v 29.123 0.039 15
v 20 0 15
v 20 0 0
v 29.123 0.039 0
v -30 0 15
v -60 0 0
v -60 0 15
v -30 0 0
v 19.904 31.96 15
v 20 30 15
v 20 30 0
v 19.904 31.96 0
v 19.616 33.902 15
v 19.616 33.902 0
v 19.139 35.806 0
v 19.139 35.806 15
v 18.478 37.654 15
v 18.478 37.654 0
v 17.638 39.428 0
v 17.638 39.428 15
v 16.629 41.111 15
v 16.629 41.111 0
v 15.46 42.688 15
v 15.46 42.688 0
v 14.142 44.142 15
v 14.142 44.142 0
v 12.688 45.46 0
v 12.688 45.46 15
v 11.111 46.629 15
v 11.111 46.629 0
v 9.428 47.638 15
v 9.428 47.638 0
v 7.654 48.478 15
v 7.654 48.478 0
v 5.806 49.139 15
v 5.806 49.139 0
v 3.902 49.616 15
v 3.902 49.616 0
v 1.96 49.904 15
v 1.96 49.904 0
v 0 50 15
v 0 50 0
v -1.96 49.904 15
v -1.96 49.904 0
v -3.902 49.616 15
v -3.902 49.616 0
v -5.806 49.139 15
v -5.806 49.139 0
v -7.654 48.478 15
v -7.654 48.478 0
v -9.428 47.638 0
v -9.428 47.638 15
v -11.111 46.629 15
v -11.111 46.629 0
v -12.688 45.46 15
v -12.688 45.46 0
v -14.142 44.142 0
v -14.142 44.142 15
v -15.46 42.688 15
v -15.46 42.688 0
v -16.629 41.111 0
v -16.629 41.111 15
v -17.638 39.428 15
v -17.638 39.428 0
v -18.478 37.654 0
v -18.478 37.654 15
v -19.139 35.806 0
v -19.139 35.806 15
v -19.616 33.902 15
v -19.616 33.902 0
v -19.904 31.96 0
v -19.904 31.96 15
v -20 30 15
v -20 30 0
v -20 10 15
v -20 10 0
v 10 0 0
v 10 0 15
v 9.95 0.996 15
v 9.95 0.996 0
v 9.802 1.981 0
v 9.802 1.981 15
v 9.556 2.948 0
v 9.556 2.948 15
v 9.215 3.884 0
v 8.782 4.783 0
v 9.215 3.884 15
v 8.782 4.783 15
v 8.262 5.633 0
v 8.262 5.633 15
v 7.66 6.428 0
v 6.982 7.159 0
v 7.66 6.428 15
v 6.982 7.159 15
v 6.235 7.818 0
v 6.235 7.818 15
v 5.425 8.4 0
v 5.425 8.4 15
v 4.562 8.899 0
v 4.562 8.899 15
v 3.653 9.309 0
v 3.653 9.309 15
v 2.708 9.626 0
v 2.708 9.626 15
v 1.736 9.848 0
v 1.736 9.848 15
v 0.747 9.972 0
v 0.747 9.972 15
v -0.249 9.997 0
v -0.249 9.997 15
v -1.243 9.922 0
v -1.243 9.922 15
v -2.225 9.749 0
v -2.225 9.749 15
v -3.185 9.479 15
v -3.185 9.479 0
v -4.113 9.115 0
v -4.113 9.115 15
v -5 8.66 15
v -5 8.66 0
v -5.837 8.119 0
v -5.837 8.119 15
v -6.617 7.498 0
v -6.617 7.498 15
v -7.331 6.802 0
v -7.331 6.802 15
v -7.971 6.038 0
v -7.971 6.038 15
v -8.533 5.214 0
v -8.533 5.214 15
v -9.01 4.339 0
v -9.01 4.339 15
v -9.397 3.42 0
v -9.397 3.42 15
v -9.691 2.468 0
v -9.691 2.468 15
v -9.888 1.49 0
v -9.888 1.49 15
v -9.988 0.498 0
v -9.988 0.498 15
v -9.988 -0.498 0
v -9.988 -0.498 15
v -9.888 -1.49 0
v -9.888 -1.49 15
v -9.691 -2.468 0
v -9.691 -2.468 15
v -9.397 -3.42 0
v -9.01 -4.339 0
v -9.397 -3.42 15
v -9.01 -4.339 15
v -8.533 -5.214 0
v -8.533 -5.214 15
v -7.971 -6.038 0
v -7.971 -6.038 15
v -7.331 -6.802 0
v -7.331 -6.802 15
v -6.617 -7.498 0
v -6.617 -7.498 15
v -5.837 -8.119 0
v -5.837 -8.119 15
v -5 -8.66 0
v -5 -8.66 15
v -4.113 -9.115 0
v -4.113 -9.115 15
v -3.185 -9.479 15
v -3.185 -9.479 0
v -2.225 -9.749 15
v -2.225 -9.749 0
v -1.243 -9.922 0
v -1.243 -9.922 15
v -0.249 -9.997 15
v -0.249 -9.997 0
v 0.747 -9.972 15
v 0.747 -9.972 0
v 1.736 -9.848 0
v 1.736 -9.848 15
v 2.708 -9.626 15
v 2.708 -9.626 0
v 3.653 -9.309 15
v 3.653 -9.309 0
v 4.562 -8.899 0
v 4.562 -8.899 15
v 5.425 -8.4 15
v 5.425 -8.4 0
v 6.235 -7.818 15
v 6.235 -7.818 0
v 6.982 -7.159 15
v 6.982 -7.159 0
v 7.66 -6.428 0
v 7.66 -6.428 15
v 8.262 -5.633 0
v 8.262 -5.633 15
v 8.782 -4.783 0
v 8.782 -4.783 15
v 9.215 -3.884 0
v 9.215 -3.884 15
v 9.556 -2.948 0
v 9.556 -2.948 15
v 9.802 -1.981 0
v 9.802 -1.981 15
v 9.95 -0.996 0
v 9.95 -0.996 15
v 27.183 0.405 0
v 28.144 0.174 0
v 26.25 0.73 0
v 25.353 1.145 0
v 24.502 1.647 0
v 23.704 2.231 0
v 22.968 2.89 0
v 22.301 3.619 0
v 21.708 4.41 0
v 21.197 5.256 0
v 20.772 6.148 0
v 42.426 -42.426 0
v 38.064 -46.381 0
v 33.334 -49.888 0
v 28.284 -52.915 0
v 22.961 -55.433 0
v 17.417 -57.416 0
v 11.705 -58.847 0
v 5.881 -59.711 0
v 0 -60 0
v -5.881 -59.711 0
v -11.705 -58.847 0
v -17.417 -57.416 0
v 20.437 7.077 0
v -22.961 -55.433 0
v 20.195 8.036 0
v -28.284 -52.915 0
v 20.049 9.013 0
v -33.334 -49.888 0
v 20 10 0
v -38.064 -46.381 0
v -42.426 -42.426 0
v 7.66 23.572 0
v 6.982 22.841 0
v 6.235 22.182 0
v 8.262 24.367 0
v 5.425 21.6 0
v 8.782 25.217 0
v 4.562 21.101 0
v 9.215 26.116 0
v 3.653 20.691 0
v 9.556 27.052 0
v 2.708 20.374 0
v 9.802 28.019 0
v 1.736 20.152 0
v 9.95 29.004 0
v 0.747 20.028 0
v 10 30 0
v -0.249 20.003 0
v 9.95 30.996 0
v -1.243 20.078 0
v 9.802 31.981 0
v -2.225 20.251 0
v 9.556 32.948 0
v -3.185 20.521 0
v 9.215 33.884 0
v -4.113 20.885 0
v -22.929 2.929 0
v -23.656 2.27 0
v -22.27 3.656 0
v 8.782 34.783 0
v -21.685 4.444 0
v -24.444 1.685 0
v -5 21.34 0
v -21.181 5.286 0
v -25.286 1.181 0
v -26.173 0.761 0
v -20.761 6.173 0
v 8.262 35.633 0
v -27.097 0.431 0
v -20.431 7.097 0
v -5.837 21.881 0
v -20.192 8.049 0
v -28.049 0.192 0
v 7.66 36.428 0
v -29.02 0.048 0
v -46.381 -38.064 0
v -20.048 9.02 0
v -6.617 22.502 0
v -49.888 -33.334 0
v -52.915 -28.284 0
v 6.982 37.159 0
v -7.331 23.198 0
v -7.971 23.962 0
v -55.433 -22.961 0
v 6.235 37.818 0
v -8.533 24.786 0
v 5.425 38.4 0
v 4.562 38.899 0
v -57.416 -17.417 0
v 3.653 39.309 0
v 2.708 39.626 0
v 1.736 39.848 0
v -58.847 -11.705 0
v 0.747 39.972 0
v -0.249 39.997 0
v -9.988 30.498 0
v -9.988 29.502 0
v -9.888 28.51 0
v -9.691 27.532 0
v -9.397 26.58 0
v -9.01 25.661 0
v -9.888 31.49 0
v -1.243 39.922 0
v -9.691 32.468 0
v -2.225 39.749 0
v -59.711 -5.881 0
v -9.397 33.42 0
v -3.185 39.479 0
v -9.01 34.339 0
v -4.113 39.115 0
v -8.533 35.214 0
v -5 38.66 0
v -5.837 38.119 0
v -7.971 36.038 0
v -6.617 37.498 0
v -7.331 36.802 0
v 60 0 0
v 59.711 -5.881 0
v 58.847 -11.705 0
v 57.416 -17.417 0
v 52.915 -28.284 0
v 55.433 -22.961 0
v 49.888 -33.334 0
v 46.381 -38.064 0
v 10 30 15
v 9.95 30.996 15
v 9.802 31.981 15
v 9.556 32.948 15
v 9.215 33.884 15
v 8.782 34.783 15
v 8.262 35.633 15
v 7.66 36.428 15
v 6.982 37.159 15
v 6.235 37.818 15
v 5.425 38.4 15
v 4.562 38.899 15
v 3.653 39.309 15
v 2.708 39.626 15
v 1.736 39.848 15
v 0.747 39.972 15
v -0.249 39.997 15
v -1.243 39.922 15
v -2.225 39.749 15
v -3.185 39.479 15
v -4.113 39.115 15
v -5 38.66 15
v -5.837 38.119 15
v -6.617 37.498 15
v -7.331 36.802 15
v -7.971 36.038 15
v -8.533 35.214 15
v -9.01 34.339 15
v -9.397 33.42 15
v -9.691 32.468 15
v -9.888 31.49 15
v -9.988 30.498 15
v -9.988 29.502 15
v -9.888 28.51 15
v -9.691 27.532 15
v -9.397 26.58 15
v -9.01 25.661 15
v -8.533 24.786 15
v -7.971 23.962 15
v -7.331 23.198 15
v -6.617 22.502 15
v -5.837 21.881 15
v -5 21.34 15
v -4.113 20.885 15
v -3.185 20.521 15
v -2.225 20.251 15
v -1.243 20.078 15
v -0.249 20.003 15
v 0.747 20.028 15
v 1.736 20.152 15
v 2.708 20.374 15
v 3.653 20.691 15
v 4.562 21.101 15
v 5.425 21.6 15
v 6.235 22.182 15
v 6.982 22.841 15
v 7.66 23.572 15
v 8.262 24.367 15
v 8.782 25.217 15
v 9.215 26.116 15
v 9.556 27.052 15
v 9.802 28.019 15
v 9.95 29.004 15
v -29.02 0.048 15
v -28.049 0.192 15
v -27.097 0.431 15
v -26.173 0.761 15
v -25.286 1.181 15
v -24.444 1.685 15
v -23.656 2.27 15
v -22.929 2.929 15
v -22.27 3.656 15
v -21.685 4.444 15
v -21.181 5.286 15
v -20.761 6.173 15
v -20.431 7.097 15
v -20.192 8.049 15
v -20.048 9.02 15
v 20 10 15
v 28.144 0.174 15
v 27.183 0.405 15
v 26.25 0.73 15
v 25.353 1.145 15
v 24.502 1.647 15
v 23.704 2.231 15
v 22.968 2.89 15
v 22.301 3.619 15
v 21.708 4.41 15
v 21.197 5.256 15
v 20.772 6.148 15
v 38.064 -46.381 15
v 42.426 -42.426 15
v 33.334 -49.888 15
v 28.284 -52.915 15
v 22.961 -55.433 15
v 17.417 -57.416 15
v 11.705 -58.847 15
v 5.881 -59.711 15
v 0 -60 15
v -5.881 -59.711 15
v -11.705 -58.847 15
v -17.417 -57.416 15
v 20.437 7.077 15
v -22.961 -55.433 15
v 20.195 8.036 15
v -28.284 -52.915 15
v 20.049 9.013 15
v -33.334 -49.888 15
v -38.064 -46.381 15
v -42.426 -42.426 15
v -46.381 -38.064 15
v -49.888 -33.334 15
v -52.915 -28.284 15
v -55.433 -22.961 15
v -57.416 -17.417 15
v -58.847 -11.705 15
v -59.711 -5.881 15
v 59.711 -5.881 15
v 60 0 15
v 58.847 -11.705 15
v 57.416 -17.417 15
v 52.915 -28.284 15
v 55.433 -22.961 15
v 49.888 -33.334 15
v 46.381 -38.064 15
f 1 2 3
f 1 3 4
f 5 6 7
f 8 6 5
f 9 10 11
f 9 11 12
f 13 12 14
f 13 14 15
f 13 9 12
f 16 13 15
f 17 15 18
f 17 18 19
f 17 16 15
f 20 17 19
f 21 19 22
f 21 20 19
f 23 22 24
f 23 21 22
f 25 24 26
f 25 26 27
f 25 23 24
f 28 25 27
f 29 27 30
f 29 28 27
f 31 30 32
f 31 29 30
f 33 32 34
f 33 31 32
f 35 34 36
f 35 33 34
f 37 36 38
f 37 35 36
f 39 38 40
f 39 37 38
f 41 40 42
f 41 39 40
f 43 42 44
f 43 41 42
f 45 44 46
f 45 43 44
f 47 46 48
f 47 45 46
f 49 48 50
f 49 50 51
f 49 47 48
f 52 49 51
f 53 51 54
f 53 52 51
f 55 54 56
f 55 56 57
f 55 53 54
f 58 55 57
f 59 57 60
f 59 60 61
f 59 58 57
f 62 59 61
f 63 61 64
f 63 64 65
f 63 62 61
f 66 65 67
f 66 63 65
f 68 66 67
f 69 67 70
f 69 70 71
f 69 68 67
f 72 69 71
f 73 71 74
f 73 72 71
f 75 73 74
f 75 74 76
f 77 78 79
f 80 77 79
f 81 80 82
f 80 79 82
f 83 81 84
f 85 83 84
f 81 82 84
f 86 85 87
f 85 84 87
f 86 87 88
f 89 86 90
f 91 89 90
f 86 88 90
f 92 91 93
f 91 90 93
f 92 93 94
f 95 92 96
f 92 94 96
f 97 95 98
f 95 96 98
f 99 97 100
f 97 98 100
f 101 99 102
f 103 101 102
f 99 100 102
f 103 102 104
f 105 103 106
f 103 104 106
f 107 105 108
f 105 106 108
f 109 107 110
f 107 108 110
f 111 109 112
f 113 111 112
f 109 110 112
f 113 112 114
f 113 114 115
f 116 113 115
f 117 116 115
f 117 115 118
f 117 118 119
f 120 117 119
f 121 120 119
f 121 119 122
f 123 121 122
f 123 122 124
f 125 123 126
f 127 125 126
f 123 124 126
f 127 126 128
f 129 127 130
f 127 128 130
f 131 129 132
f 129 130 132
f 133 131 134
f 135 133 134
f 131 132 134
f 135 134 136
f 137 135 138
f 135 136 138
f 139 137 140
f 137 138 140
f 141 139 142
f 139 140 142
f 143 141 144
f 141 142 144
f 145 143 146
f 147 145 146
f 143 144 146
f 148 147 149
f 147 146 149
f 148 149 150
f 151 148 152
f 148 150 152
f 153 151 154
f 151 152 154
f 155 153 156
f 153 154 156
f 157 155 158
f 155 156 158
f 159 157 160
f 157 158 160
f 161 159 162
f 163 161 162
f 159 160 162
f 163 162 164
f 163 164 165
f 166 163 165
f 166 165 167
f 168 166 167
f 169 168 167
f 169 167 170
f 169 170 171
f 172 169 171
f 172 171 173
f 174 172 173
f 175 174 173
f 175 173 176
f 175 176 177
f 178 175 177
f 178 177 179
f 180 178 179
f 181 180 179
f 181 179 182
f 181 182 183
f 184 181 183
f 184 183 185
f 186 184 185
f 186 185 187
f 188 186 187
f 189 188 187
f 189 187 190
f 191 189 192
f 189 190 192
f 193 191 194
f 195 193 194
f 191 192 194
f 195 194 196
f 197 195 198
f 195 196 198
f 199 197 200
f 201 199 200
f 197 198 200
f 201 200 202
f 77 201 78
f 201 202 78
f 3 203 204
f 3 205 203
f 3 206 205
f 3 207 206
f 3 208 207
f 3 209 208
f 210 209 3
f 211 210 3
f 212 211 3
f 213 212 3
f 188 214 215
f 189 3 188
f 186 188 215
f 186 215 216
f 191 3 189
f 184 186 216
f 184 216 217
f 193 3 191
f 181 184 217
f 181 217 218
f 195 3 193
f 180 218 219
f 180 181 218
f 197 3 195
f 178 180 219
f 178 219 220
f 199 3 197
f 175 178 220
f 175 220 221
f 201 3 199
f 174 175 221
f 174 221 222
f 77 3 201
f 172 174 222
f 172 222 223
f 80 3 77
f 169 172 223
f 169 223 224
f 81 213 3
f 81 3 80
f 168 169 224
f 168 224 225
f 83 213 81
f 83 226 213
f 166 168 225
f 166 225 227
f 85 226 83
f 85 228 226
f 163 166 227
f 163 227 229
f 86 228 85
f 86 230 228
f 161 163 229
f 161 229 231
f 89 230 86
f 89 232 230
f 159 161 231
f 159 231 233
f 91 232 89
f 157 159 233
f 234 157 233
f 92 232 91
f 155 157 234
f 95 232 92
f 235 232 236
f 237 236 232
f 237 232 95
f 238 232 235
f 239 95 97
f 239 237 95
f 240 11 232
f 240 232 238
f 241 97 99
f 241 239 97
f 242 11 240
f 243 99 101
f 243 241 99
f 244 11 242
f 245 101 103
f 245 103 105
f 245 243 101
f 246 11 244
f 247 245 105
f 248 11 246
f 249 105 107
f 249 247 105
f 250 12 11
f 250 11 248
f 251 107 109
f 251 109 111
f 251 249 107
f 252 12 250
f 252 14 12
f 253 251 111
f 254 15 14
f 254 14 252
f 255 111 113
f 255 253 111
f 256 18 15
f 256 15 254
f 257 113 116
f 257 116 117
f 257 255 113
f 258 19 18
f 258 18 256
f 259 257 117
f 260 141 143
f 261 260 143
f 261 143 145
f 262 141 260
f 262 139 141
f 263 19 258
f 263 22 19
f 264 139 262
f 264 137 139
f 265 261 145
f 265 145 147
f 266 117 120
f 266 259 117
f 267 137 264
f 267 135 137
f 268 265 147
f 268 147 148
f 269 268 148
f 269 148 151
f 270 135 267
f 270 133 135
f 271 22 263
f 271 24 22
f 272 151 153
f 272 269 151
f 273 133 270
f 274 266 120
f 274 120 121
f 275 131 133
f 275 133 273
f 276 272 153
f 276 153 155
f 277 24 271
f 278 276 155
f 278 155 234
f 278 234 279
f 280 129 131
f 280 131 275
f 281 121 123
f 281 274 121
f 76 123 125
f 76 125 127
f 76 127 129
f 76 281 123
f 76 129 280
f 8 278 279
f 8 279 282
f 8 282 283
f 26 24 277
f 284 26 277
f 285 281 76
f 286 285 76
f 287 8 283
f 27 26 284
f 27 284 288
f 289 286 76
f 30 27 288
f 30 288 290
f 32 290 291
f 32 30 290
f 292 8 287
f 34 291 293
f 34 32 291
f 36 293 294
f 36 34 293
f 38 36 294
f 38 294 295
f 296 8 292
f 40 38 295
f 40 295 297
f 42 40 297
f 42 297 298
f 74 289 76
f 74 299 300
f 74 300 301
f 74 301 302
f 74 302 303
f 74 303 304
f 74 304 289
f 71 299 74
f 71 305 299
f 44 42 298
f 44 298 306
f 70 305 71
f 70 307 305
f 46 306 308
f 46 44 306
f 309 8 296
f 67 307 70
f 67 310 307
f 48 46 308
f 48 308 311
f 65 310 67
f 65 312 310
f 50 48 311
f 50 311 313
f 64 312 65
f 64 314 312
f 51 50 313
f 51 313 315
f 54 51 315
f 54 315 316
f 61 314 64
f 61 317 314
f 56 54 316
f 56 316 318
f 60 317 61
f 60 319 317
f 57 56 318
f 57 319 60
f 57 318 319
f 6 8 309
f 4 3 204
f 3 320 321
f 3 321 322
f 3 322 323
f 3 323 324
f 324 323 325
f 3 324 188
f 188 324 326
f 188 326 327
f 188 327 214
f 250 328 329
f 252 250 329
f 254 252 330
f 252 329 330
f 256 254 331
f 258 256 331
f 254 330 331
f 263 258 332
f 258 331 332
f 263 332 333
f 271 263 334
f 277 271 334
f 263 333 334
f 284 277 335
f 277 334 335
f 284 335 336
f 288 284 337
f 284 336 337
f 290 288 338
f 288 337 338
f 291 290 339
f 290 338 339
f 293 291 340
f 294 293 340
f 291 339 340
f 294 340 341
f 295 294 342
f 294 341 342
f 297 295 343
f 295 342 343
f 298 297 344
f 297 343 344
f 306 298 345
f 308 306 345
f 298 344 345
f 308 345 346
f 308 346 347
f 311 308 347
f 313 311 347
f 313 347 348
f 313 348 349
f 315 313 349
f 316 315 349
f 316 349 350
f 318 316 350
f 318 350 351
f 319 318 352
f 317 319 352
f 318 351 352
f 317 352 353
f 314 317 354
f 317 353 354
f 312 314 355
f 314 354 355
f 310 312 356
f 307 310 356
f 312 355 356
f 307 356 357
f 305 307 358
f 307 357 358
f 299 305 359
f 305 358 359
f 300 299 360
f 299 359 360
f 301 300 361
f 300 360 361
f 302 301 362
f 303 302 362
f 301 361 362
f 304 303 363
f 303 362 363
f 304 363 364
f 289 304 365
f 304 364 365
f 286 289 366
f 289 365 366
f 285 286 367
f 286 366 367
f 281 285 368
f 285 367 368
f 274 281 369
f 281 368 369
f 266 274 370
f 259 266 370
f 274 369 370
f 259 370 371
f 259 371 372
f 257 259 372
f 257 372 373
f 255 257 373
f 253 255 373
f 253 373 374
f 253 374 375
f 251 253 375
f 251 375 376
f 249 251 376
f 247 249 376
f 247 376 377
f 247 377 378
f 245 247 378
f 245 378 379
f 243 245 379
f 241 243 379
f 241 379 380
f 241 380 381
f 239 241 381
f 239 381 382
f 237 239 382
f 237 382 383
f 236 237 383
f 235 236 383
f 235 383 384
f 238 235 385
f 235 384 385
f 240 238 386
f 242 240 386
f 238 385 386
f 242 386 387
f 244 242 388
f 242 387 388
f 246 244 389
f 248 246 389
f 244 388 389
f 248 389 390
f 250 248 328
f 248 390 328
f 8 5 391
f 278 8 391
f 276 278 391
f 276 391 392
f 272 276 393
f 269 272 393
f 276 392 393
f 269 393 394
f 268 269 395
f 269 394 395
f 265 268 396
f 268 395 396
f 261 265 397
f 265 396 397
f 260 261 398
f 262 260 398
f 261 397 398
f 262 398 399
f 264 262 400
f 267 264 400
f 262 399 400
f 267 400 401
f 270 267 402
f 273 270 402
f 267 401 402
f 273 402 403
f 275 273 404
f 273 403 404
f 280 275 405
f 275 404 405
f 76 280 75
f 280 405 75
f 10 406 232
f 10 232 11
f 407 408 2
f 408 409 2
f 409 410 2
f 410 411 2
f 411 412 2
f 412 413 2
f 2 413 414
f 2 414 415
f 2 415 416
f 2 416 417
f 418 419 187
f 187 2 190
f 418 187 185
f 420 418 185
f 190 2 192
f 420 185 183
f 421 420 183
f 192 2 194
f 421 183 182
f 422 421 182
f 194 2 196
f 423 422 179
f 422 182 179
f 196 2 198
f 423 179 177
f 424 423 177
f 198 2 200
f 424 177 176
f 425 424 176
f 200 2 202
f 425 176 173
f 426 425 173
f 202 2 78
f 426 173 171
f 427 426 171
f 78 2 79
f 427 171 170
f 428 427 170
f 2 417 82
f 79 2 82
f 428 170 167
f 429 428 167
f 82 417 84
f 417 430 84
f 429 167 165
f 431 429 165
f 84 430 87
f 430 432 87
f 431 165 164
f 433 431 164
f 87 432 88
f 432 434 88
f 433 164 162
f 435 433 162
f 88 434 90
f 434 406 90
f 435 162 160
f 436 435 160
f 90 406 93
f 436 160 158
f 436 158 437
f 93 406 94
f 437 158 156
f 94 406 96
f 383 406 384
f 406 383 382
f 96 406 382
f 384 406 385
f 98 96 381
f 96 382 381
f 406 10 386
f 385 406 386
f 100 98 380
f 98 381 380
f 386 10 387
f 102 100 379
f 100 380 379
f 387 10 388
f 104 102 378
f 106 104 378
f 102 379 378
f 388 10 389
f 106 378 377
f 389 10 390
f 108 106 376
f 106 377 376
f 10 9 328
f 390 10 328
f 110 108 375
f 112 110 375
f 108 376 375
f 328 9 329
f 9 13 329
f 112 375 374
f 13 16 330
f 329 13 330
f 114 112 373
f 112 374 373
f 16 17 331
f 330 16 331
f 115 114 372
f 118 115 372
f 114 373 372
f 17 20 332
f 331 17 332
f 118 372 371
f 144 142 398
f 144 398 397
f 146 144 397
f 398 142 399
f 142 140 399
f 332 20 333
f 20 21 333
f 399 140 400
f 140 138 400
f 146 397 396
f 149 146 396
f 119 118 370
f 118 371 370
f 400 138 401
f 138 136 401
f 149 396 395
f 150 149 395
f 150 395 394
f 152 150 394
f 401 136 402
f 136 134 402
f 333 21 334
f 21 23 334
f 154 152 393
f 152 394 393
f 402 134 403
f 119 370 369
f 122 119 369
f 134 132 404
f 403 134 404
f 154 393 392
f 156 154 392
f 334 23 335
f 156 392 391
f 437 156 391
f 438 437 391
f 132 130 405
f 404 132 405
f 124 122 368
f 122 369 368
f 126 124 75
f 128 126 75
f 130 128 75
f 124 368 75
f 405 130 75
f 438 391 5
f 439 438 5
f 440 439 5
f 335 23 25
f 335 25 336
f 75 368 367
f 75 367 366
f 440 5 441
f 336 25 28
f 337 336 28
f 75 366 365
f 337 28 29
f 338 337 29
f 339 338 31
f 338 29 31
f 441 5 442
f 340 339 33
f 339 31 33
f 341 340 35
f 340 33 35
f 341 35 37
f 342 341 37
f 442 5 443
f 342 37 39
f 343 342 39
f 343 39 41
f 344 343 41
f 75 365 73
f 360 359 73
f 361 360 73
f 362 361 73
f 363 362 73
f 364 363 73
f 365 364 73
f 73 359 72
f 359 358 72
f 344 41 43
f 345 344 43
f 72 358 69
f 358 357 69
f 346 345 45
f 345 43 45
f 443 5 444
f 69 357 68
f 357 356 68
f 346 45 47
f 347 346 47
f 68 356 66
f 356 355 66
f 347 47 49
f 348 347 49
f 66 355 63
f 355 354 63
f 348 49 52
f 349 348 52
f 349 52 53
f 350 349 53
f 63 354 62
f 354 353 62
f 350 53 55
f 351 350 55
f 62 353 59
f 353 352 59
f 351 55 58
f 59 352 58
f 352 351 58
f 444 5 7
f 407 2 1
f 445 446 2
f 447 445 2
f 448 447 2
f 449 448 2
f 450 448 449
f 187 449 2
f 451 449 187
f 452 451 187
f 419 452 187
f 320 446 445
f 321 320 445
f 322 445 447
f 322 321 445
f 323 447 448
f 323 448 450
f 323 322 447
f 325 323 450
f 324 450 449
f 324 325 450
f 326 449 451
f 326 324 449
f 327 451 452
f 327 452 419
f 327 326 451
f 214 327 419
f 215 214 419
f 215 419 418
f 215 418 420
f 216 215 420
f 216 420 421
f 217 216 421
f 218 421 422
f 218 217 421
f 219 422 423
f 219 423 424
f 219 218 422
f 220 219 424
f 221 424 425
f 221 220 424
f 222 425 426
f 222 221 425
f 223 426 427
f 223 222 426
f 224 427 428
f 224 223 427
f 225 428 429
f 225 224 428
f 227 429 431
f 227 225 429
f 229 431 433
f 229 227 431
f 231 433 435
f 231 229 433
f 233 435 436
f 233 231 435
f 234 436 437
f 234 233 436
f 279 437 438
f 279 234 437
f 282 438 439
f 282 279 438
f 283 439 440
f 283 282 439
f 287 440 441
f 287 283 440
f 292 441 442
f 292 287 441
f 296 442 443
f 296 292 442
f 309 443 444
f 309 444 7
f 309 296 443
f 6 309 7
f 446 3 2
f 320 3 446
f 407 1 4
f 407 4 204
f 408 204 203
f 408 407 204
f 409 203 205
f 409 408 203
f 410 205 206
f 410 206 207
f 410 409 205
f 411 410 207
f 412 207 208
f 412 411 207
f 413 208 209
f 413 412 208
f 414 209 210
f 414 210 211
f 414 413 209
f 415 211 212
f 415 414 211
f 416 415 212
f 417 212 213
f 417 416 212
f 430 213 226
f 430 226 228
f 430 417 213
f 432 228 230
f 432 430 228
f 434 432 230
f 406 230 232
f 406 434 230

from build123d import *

# Parameters (mm, degrees)
BOSS_EXTRUDE1_DEPTH = 15
BOSS_EXTRUDE2_DEPTH = 15
BOSS_EXTRUDE4_DEPTH = 15
BOSS_EXTRUDE5_DEPTH = 15
SKETCH7_R           = 10
CUT_EXTRUDE1_DEPTH  = 15
SKETCH8_R           = 10
CUT_EXTRUDE2_DEPTH  = 15


with BuildPart() as part:
    # Sketch2 → Boss-Extrude1 (new body)
    with BuildSketch(Plane.XY):
        with BuildLine():
            Line((-60, 0), (60, 0))
            ThreePointArc((60, 0), (0, -60), (-60, 0))
        make_face()
    extrude(amount=BOSS_EXTRUDE1_DEPTH)

    # Sketch3 → Boss-Extrude2 (add)
    with BuildSketch(Plane.XY.offset(15)):
        with BuildLine():
            Line((-20, 30), (-20, 0))
            Line((-20, 0), (20, 0))
            Line((20, 0), (20, 30))
            ThreePointArc((20, 30), (0, 50), (-20, 30))
        make_face()
    extrude(amount=-BOSS_EXTRUDE2_DEPTH)

    # Sketch4 → Boss-Extrude4 (add)
    with BuildSketch(Plane.XY.offset(15)):
        with BuildLine():
            Line((20, 10), (20, 0))
            Line((20, 0), (29.123112456, 0.038520781))
            ThreePointArc((29.123112456, 0.038520781), (22.625419488, 3.246070605), (20, 10))
        make_face()
    extrude(amount=-BOSS_EXTRUDE4_DEPTH)

    # Sketch6 → Boss-Extrude5 (add)
    with BuildSketch(Plane.XY.offset(15)):
        with BuildLine():
            Line((-20, 10), (-20, 0))
            Line((-20, 0), (-30, 0))
            ThreePointArc((-30, 0), (-22.928932188, 2.928932188), (-20, 10))
        make_face()
    extrude(amount=-BOSS_EXTRUDE5_DEPTH)

    # Sketch7 → Cut-Extrude1 (cut)
    with BuildSketch(Plane.XY.offset(15)):
        with Locations((0, 30)):
            Circle(SKETCH7_R)
    extrude(amount=-CUT_EXTRUDE1_DEPTH, mode=Mode.SUBTRACT)

    # Sketch8 → Cut-Extrude2 (cut)
    with BuildSketch(Plane.XY.offset(15)):
        Circle(SKETCH8_R)
    extrude(amount=-CUT_EXTRUDE2_DEPTH, mode=Mode.SUBTRACT)


solid = part.part
